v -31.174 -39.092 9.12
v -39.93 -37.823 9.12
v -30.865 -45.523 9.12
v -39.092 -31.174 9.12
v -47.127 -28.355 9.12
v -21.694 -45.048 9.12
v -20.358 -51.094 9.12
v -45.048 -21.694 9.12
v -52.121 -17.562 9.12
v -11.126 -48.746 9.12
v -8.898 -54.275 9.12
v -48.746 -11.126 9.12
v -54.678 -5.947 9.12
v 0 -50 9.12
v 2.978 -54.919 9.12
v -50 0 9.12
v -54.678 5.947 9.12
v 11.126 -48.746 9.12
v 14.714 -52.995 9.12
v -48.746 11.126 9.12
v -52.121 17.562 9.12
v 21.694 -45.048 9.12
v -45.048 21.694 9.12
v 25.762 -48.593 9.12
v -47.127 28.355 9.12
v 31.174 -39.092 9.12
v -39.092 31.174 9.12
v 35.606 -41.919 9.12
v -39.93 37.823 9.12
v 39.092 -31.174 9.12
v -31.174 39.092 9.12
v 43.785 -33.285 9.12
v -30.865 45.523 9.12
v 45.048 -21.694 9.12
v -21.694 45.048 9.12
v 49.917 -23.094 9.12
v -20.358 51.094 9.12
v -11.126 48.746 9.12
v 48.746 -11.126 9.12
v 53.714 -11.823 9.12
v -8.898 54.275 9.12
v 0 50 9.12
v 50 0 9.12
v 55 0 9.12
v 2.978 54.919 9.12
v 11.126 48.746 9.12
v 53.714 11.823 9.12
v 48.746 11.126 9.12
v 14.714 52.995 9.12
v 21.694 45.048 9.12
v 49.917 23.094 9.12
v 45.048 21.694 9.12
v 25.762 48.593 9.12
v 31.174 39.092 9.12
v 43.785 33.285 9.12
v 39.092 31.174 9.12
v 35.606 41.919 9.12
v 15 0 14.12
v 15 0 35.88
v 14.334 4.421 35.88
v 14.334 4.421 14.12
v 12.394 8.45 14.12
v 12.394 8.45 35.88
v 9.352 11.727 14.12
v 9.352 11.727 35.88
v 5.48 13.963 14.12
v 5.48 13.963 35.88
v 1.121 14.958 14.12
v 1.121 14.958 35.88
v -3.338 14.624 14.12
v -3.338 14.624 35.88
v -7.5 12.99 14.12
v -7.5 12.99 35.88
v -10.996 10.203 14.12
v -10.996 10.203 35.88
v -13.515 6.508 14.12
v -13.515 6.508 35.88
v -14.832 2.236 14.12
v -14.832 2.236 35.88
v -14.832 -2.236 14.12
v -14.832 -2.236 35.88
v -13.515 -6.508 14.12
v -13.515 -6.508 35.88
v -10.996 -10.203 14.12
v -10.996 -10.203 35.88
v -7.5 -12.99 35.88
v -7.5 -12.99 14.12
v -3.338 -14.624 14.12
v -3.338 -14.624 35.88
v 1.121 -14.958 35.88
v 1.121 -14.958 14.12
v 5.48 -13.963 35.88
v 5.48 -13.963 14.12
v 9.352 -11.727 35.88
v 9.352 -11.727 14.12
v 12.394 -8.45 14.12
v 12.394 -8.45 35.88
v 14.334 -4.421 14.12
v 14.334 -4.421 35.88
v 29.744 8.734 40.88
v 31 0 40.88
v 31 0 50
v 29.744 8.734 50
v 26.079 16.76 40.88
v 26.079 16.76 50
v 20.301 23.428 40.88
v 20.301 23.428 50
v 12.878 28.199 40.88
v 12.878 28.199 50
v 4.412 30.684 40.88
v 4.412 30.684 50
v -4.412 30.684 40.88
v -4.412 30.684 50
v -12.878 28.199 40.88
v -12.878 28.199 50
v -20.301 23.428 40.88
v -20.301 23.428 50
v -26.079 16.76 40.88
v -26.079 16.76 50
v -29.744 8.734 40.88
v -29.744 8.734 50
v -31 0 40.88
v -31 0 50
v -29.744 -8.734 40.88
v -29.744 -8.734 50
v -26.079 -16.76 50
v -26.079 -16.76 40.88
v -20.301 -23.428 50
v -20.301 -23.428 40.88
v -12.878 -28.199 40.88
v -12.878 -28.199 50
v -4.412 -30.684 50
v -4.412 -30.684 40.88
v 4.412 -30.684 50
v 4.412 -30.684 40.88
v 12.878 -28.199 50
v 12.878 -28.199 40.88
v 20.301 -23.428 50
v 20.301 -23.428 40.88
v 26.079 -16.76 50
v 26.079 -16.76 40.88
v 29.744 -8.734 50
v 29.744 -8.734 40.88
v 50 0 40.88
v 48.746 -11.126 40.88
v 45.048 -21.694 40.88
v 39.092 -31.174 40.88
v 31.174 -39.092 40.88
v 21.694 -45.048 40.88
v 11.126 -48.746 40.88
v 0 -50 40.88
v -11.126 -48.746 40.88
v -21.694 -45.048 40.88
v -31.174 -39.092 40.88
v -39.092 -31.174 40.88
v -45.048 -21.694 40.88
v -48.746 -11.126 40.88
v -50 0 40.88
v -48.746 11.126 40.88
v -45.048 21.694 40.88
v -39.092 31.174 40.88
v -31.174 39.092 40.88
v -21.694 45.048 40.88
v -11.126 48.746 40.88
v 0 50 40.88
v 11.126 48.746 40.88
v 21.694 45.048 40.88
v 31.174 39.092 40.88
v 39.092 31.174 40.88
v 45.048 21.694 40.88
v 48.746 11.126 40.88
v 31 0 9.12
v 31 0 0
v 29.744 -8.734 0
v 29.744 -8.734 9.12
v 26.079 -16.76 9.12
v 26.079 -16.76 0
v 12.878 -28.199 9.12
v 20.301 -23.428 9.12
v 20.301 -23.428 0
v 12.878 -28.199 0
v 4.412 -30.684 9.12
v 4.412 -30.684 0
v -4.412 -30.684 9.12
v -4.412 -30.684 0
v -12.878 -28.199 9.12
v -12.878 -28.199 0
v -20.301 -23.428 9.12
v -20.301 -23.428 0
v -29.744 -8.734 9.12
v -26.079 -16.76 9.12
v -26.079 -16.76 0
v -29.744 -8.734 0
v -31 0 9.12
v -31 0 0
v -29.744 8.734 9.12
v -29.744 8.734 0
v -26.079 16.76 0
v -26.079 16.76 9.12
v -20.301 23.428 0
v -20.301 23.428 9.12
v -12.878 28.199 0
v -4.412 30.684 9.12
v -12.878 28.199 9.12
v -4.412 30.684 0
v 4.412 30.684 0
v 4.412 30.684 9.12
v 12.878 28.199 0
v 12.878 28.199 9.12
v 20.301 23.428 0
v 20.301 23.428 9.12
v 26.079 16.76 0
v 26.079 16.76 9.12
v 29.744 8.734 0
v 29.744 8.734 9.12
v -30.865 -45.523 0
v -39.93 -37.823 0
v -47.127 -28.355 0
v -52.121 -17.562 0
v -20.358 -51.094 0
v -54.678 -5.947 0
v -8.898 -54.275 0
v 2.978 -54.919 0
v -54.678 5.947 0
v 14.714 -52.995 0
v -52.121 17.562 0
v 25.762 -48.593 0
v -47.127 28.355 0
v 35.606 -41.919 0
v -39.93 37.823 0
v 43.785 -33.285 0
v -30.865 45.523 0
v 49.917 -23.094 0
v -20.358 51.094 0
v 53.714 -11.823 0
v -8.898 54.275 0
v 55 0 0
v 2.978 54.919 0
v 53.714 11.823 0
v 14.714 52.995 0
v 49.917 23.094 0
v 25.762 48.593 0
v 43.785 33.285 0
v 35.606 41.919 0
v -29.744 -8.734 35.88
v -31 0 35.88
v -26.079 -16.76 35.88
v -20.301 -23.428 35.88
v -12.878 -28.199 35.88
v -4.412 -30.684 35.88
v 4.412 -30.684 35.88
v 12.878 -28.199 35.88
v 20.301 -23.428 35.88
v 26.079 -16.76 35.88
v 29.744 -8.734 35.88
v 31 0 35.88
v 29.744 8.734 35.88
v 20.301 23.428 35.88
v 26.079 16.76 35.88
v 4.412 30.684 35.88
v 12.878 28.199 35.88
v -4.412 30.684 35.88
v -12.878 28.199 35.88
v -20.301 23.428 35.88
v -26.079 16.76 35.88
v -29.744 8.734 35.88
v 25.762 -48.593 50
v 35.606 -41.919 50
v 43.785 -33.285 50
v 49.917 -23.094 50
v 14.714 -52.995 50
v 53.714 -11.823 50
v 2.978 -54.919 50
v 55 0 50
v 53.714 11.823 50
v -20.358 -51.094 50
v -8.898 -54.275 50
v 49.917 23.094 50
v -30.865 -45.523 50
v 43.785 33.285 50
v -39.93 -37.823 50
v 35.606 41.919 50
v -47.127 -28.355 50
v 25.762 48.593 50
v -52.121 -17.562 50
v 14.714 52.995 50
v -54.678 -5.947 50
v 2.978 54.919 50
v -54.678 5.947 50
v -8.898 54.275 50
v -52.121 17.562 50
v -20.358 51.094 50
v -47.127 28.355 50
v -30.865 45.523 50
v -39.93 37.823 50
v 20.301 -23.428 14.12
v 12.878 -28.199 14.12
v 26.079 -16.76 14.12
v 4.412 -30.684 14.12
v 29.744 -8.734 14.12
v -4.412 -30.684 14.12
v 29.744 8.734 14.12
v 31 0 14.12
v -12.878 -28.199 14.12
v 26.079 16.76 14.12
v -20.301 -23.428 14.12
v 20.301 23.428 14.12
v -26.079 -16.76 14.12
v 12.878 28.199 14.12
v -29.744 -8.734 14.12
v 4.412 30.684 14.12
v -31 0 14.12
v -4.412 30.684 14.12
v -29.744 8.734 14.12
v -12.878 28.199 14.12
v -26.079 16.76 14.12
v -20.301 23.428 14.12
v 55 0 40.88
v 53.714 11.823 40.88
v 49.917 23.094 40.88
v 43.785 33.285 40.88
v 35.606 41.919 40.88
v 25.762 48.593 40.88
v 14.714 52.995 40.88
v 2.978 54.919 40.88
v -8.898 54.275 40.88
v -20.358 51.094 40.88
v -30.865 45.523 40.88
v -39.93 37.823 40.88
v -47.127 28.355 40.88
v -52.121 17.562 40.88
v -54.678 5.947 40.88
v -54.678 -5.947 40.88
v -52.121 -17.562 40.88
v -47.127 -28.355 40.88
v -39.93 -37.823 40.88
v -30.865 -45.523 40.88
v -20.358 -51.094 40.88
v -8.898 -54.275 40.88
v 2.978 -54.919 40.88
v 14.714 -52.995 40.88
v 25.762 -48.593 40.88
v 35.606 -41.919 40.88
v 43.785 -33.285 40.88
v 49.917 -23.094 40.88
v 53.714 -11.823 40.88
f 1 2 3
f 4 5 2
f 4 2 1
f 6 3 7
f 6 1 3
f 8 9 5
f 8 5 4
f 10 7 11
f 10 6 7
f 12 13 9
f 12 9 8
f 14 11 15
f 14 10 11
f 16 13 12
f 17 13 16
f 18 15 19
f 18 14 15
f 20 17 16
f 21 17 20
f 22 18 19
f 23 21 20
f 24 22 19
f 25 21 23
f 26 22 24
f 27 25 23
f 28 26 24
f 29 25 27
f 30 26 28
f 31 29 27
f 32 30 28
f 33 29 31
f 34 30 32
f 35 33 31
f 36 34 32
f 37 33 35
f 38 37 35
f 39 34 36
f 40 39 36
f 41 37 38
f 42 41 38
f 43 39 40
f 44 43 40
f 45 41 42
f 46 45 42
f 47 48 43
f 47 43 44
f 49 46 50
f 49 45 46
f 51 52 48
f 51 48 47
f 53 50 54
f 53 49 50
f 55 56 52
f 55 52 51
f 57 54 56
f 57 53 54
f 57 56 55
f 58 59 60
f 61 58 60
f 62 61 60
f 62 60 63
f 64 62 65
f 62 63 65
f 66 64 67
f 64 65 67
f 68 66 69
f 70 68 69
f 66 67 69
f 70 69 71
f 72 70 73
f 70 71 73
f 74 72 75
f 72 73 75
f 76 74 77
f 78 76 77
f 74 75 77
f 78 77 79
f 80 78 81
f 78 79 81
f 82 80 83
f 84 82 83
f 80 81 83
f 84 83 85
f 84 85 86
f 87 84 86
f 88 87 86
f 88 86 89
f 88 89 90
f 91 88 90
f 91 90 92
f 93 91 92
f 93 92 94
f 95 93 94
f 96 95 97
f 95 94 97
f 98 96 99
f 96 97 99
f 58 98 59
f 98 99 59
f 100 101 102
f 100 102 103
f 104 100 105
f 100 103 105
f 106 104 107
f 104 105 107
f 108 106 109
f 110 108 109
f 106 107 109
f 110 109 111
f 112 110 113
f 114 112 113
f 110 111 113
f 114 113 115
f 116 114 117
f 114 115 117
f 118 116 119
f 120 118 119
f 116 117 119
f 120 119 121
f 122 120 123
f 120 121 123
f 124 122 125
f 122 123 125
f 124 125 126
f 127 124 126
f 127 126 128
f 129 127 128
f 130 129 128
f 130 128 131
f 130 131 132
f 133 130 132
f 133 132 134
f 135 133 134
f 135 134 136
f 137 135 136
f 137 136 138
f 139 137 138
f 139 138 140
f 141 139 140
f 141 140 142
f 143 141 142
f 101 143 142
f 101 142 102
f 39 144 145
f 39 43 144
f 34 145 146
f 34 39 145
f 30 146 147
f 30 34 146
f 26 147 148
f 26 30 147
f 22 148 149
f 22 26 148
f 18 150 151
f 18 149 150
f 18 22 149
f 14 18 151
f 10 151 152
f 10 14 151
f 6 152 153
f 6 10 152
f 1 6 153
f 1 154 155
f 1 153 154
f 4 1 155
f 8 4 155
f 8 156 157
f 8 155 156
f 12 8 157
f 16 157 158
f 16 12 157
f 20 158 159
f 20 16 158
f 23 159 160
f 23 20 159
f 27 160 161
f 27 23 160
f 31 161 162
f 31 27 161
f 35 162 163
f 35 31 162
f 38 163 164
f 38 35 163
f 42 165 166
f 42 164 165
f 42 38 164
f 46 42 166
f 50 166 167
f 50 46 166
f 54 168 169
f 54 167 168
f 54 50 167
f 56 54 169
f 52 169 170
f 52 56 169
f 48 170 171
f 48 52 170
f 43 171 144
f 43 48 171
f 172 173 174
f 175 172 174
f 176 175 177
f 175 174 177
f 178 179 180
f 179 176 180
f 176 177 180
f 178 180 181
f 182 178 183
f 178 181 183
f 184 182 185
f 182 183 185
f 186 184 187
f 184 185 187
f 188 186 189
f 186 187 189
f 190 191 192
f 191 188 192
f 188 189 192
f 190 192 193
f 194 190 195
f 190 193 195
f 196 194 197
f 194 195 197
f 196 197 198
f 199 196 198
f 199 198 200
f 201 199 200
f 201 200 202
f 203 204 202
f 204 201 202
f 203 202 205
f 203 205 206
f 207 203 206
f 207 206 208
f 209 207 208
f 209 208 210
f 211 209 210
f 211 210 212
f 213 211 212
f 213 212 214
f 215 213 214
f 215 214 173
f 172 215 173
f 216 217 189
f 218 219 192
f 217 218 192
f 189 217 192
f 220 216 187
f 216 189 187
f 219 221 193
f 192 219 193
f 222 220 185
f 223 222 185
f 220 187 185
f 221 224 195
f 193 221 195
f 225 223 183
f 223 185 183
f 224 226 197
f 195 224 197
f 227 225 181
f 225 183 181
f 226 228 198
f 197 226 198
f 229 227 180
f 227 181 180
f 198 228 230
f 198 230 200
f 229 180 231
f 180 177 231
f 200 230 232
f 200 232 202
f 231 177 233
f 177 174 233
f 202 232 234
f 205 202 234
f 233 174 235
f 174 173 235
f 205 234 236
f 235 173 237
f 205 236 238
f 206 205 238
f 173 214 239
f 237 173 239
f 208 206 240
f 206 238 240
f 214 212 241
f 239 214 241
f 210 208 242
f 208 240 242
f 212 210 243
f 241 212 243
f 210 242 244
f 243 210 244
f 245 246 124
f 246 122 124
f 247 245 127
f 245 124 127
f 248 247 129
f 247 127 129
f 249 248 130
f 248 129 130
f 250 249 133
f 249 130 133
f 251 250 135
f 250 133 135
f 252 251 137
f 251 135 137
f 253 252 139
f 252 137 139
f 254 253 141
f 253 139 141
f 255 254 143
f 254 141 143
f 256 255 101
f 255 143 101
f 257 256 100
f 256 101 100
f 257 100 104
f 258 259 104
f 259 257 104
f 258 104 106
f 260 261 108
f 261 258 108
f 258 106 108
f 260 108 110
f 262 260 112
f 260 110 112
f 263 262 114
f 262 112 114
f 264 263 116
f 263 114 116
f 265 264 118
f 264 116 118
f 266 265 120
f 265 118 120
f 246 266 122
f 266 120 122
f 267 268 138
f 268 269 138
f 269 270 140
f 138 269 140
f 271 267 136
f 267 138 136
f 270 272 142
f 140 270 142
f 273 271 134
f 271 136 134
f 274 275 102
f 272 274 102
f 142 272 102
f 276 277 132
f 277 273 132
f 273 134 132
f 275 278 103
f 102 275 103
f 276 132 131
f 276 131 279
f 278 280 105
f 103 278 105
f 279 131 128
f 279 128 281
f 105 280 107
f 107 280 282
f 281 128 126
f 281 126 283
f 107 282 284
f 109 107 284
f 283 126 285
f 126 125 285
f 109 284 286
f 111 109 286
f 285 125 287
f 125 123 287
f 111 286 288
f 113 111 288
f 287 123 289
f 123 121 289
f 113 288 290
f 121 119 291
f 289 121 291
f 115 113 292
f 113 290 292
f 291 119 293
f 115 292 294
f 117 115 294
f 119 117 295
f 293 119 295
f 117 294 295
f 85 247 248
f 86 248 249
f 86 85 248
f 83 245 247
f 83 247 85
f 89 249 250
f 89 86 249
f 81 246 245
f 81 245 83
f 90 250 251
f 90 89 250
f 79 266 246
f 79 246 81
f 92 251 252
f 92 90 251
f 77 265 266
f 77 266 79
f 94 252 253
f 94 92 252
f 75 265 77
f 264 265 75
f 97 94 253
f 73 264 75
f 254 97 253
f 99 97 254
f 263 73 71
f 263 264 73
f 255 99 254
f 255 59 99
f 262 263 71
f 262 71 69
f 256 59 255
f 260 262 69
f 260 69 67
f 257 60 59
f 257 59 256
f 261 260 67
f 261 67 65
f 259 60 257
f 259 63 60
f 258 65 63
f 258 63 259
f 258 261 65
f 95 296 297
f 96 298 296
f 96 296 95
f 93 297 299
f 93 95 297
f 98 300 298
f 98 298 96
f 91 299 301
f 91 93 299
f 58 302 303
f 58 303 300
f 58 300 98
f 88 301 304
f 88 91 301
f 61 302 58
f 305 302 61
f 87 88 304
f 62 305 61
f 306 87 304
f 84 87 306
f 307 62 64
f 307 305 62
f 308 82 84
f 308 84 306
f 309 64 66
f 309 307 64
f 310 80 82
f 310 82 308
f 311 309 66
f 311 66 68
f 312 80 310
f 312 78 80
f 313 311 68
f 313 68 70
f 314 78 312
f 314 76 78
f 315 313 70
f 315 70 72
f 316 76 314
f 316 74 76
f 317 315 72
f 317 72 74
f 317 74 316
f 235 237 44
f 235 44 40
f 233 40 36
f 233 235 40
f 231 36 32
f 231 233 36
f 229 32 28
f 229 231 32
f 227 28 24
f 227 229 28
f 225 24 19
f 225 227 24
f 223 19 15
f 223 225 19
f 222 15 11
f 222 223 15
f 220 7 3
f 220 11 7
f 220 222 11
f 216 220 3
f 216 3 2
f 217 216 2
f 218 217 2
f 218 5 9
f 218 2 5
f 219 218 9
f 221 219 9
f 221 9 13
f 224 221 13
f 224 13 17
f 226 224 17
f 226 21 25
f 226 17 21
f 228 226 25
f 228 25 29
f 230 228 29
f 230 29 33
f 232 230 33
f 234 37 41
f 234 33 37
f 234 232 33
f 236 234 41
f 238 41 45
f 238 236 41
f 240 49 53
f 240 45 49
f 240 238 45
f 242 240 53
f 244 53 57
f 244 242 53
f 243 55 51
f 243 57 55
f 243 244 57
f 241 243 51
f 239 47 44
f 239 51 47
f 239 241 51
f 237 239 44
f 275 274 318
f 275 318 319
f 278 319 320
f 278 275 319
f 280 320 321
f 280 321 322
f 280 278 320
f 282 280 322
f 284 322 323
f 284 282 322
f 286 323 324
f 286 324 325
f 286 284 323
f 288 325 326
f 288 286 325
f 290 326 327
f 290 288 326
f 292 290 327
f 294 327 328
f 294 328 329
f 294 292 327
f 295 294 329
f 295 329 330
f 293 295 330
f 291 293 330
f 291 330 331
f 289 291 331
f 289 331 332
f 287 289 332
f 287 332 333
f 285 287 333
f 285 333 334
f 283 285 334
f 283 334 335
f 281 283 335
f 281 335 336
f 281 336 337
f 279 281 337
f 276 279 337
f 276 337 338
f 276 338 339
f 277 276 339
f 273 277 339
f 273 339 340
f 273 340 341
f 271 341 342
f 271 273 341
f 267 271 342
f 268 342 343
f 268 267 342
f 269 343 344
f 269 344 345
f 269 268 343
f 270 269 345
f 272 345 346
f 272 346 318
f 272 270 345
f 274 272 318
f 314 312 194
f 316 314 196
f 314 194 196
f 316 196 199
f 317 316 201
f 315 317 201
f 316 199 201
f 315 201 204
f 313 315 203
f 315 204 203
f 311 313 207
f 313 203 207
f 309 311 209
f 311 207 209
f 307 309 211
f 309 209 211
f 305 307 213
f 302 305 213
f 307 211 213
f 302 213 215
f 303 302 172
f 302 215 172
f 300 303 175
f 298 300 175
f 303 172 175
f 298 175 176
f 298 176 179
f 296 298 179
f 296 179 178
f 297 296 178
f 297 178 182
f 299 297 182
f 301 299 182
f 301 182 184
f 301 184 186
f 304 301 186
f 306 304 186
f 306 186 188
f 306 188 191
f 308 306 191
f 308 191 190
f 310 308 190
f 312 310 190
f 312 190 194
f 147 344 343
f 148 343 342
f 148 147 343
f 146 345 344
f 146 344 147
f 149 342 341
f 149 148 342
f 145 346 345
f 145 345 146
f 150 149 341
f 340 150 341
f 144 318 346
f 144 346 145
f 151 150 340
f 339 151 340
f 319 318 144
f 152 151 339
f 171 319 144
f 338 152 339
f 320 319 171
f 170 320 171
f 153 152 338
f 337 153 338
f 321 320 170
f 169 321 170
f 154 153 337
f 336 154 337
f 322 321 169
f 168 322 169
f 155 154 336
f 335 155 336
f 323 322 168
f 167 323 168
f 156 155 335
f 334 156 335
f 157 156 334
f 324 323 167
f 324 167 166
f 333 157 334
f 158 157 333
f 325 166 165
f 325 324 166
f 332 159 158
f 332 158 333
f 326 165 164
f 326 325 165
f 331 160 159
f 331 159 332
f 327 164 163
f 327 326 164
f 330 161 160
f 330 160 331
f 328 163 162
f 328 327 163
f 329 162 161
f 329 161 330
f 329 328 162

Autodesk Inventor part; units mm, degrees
ref_plane "YZ Plane" through (0, 0, 0) normal (1, 0, 0) x (0, 1, 0)
ref_plane "XZ Plane" through (0, 0, 0) normal (0, 1, 0) x (-1, 0, 0)
sketch "Sketch1" plane through (0, 0, 0) normal (0, 0, 1) x (1, 0, 0)
  circle A0 centre (0, 0) radius 31
  circle A1 centre (0, 0) radius 55
  dimension "d0" = 62
  dimension "d1" = 110
extrude "Extrusion1" add sketch "Sketch1" along normal blind 9.12
sketch "Sketch2" plane through (0, 0, 9.12) normal (0, 0, 1) x (1, 0, 0)
  circle A0 centre (0, 0) radius 50
  circle A1 centre (0, 0) radius 15
  dimension "d4" = 100
  dimension "d5" = 30
extrude "Extrusion2" add sketch "Sketch2" along normal blind 31.76
ref_plane "Work Plane1" through (0, 0, 25) normal (0, 0, 1) x (1, 0, 0)
sketch "Sketch3" plane through (0, 0, 9.12) normal (0, 0, -1) x (-1, 0, 0)
  circle A0 centre (0, 0) radius 31 projected
  circle A1 centre (0, 0) radius 31
  dimension "d8" = 62
extrude "Extrusion3" cut sketch "Sketch3" against normal blind 5
mirror "Mirror1" about plane through (0, 0, 25) normal (0, 0, 1) of "Extrusion1", "Extrusion3", "Extrusion2"
sketch "Sketch4" plane through (0, 0, 9.12) normal (0, 0, -1) x (-1, 0, 0)
  circle A0 centre (0, 0) radius 31
  dimension "d11" = 62
extrude "Extrusion4" cut sketch "Sketch4" against normal blind 5
properties part number "Rodillo Guia de Cadena" material "Steel, Galvanized"
